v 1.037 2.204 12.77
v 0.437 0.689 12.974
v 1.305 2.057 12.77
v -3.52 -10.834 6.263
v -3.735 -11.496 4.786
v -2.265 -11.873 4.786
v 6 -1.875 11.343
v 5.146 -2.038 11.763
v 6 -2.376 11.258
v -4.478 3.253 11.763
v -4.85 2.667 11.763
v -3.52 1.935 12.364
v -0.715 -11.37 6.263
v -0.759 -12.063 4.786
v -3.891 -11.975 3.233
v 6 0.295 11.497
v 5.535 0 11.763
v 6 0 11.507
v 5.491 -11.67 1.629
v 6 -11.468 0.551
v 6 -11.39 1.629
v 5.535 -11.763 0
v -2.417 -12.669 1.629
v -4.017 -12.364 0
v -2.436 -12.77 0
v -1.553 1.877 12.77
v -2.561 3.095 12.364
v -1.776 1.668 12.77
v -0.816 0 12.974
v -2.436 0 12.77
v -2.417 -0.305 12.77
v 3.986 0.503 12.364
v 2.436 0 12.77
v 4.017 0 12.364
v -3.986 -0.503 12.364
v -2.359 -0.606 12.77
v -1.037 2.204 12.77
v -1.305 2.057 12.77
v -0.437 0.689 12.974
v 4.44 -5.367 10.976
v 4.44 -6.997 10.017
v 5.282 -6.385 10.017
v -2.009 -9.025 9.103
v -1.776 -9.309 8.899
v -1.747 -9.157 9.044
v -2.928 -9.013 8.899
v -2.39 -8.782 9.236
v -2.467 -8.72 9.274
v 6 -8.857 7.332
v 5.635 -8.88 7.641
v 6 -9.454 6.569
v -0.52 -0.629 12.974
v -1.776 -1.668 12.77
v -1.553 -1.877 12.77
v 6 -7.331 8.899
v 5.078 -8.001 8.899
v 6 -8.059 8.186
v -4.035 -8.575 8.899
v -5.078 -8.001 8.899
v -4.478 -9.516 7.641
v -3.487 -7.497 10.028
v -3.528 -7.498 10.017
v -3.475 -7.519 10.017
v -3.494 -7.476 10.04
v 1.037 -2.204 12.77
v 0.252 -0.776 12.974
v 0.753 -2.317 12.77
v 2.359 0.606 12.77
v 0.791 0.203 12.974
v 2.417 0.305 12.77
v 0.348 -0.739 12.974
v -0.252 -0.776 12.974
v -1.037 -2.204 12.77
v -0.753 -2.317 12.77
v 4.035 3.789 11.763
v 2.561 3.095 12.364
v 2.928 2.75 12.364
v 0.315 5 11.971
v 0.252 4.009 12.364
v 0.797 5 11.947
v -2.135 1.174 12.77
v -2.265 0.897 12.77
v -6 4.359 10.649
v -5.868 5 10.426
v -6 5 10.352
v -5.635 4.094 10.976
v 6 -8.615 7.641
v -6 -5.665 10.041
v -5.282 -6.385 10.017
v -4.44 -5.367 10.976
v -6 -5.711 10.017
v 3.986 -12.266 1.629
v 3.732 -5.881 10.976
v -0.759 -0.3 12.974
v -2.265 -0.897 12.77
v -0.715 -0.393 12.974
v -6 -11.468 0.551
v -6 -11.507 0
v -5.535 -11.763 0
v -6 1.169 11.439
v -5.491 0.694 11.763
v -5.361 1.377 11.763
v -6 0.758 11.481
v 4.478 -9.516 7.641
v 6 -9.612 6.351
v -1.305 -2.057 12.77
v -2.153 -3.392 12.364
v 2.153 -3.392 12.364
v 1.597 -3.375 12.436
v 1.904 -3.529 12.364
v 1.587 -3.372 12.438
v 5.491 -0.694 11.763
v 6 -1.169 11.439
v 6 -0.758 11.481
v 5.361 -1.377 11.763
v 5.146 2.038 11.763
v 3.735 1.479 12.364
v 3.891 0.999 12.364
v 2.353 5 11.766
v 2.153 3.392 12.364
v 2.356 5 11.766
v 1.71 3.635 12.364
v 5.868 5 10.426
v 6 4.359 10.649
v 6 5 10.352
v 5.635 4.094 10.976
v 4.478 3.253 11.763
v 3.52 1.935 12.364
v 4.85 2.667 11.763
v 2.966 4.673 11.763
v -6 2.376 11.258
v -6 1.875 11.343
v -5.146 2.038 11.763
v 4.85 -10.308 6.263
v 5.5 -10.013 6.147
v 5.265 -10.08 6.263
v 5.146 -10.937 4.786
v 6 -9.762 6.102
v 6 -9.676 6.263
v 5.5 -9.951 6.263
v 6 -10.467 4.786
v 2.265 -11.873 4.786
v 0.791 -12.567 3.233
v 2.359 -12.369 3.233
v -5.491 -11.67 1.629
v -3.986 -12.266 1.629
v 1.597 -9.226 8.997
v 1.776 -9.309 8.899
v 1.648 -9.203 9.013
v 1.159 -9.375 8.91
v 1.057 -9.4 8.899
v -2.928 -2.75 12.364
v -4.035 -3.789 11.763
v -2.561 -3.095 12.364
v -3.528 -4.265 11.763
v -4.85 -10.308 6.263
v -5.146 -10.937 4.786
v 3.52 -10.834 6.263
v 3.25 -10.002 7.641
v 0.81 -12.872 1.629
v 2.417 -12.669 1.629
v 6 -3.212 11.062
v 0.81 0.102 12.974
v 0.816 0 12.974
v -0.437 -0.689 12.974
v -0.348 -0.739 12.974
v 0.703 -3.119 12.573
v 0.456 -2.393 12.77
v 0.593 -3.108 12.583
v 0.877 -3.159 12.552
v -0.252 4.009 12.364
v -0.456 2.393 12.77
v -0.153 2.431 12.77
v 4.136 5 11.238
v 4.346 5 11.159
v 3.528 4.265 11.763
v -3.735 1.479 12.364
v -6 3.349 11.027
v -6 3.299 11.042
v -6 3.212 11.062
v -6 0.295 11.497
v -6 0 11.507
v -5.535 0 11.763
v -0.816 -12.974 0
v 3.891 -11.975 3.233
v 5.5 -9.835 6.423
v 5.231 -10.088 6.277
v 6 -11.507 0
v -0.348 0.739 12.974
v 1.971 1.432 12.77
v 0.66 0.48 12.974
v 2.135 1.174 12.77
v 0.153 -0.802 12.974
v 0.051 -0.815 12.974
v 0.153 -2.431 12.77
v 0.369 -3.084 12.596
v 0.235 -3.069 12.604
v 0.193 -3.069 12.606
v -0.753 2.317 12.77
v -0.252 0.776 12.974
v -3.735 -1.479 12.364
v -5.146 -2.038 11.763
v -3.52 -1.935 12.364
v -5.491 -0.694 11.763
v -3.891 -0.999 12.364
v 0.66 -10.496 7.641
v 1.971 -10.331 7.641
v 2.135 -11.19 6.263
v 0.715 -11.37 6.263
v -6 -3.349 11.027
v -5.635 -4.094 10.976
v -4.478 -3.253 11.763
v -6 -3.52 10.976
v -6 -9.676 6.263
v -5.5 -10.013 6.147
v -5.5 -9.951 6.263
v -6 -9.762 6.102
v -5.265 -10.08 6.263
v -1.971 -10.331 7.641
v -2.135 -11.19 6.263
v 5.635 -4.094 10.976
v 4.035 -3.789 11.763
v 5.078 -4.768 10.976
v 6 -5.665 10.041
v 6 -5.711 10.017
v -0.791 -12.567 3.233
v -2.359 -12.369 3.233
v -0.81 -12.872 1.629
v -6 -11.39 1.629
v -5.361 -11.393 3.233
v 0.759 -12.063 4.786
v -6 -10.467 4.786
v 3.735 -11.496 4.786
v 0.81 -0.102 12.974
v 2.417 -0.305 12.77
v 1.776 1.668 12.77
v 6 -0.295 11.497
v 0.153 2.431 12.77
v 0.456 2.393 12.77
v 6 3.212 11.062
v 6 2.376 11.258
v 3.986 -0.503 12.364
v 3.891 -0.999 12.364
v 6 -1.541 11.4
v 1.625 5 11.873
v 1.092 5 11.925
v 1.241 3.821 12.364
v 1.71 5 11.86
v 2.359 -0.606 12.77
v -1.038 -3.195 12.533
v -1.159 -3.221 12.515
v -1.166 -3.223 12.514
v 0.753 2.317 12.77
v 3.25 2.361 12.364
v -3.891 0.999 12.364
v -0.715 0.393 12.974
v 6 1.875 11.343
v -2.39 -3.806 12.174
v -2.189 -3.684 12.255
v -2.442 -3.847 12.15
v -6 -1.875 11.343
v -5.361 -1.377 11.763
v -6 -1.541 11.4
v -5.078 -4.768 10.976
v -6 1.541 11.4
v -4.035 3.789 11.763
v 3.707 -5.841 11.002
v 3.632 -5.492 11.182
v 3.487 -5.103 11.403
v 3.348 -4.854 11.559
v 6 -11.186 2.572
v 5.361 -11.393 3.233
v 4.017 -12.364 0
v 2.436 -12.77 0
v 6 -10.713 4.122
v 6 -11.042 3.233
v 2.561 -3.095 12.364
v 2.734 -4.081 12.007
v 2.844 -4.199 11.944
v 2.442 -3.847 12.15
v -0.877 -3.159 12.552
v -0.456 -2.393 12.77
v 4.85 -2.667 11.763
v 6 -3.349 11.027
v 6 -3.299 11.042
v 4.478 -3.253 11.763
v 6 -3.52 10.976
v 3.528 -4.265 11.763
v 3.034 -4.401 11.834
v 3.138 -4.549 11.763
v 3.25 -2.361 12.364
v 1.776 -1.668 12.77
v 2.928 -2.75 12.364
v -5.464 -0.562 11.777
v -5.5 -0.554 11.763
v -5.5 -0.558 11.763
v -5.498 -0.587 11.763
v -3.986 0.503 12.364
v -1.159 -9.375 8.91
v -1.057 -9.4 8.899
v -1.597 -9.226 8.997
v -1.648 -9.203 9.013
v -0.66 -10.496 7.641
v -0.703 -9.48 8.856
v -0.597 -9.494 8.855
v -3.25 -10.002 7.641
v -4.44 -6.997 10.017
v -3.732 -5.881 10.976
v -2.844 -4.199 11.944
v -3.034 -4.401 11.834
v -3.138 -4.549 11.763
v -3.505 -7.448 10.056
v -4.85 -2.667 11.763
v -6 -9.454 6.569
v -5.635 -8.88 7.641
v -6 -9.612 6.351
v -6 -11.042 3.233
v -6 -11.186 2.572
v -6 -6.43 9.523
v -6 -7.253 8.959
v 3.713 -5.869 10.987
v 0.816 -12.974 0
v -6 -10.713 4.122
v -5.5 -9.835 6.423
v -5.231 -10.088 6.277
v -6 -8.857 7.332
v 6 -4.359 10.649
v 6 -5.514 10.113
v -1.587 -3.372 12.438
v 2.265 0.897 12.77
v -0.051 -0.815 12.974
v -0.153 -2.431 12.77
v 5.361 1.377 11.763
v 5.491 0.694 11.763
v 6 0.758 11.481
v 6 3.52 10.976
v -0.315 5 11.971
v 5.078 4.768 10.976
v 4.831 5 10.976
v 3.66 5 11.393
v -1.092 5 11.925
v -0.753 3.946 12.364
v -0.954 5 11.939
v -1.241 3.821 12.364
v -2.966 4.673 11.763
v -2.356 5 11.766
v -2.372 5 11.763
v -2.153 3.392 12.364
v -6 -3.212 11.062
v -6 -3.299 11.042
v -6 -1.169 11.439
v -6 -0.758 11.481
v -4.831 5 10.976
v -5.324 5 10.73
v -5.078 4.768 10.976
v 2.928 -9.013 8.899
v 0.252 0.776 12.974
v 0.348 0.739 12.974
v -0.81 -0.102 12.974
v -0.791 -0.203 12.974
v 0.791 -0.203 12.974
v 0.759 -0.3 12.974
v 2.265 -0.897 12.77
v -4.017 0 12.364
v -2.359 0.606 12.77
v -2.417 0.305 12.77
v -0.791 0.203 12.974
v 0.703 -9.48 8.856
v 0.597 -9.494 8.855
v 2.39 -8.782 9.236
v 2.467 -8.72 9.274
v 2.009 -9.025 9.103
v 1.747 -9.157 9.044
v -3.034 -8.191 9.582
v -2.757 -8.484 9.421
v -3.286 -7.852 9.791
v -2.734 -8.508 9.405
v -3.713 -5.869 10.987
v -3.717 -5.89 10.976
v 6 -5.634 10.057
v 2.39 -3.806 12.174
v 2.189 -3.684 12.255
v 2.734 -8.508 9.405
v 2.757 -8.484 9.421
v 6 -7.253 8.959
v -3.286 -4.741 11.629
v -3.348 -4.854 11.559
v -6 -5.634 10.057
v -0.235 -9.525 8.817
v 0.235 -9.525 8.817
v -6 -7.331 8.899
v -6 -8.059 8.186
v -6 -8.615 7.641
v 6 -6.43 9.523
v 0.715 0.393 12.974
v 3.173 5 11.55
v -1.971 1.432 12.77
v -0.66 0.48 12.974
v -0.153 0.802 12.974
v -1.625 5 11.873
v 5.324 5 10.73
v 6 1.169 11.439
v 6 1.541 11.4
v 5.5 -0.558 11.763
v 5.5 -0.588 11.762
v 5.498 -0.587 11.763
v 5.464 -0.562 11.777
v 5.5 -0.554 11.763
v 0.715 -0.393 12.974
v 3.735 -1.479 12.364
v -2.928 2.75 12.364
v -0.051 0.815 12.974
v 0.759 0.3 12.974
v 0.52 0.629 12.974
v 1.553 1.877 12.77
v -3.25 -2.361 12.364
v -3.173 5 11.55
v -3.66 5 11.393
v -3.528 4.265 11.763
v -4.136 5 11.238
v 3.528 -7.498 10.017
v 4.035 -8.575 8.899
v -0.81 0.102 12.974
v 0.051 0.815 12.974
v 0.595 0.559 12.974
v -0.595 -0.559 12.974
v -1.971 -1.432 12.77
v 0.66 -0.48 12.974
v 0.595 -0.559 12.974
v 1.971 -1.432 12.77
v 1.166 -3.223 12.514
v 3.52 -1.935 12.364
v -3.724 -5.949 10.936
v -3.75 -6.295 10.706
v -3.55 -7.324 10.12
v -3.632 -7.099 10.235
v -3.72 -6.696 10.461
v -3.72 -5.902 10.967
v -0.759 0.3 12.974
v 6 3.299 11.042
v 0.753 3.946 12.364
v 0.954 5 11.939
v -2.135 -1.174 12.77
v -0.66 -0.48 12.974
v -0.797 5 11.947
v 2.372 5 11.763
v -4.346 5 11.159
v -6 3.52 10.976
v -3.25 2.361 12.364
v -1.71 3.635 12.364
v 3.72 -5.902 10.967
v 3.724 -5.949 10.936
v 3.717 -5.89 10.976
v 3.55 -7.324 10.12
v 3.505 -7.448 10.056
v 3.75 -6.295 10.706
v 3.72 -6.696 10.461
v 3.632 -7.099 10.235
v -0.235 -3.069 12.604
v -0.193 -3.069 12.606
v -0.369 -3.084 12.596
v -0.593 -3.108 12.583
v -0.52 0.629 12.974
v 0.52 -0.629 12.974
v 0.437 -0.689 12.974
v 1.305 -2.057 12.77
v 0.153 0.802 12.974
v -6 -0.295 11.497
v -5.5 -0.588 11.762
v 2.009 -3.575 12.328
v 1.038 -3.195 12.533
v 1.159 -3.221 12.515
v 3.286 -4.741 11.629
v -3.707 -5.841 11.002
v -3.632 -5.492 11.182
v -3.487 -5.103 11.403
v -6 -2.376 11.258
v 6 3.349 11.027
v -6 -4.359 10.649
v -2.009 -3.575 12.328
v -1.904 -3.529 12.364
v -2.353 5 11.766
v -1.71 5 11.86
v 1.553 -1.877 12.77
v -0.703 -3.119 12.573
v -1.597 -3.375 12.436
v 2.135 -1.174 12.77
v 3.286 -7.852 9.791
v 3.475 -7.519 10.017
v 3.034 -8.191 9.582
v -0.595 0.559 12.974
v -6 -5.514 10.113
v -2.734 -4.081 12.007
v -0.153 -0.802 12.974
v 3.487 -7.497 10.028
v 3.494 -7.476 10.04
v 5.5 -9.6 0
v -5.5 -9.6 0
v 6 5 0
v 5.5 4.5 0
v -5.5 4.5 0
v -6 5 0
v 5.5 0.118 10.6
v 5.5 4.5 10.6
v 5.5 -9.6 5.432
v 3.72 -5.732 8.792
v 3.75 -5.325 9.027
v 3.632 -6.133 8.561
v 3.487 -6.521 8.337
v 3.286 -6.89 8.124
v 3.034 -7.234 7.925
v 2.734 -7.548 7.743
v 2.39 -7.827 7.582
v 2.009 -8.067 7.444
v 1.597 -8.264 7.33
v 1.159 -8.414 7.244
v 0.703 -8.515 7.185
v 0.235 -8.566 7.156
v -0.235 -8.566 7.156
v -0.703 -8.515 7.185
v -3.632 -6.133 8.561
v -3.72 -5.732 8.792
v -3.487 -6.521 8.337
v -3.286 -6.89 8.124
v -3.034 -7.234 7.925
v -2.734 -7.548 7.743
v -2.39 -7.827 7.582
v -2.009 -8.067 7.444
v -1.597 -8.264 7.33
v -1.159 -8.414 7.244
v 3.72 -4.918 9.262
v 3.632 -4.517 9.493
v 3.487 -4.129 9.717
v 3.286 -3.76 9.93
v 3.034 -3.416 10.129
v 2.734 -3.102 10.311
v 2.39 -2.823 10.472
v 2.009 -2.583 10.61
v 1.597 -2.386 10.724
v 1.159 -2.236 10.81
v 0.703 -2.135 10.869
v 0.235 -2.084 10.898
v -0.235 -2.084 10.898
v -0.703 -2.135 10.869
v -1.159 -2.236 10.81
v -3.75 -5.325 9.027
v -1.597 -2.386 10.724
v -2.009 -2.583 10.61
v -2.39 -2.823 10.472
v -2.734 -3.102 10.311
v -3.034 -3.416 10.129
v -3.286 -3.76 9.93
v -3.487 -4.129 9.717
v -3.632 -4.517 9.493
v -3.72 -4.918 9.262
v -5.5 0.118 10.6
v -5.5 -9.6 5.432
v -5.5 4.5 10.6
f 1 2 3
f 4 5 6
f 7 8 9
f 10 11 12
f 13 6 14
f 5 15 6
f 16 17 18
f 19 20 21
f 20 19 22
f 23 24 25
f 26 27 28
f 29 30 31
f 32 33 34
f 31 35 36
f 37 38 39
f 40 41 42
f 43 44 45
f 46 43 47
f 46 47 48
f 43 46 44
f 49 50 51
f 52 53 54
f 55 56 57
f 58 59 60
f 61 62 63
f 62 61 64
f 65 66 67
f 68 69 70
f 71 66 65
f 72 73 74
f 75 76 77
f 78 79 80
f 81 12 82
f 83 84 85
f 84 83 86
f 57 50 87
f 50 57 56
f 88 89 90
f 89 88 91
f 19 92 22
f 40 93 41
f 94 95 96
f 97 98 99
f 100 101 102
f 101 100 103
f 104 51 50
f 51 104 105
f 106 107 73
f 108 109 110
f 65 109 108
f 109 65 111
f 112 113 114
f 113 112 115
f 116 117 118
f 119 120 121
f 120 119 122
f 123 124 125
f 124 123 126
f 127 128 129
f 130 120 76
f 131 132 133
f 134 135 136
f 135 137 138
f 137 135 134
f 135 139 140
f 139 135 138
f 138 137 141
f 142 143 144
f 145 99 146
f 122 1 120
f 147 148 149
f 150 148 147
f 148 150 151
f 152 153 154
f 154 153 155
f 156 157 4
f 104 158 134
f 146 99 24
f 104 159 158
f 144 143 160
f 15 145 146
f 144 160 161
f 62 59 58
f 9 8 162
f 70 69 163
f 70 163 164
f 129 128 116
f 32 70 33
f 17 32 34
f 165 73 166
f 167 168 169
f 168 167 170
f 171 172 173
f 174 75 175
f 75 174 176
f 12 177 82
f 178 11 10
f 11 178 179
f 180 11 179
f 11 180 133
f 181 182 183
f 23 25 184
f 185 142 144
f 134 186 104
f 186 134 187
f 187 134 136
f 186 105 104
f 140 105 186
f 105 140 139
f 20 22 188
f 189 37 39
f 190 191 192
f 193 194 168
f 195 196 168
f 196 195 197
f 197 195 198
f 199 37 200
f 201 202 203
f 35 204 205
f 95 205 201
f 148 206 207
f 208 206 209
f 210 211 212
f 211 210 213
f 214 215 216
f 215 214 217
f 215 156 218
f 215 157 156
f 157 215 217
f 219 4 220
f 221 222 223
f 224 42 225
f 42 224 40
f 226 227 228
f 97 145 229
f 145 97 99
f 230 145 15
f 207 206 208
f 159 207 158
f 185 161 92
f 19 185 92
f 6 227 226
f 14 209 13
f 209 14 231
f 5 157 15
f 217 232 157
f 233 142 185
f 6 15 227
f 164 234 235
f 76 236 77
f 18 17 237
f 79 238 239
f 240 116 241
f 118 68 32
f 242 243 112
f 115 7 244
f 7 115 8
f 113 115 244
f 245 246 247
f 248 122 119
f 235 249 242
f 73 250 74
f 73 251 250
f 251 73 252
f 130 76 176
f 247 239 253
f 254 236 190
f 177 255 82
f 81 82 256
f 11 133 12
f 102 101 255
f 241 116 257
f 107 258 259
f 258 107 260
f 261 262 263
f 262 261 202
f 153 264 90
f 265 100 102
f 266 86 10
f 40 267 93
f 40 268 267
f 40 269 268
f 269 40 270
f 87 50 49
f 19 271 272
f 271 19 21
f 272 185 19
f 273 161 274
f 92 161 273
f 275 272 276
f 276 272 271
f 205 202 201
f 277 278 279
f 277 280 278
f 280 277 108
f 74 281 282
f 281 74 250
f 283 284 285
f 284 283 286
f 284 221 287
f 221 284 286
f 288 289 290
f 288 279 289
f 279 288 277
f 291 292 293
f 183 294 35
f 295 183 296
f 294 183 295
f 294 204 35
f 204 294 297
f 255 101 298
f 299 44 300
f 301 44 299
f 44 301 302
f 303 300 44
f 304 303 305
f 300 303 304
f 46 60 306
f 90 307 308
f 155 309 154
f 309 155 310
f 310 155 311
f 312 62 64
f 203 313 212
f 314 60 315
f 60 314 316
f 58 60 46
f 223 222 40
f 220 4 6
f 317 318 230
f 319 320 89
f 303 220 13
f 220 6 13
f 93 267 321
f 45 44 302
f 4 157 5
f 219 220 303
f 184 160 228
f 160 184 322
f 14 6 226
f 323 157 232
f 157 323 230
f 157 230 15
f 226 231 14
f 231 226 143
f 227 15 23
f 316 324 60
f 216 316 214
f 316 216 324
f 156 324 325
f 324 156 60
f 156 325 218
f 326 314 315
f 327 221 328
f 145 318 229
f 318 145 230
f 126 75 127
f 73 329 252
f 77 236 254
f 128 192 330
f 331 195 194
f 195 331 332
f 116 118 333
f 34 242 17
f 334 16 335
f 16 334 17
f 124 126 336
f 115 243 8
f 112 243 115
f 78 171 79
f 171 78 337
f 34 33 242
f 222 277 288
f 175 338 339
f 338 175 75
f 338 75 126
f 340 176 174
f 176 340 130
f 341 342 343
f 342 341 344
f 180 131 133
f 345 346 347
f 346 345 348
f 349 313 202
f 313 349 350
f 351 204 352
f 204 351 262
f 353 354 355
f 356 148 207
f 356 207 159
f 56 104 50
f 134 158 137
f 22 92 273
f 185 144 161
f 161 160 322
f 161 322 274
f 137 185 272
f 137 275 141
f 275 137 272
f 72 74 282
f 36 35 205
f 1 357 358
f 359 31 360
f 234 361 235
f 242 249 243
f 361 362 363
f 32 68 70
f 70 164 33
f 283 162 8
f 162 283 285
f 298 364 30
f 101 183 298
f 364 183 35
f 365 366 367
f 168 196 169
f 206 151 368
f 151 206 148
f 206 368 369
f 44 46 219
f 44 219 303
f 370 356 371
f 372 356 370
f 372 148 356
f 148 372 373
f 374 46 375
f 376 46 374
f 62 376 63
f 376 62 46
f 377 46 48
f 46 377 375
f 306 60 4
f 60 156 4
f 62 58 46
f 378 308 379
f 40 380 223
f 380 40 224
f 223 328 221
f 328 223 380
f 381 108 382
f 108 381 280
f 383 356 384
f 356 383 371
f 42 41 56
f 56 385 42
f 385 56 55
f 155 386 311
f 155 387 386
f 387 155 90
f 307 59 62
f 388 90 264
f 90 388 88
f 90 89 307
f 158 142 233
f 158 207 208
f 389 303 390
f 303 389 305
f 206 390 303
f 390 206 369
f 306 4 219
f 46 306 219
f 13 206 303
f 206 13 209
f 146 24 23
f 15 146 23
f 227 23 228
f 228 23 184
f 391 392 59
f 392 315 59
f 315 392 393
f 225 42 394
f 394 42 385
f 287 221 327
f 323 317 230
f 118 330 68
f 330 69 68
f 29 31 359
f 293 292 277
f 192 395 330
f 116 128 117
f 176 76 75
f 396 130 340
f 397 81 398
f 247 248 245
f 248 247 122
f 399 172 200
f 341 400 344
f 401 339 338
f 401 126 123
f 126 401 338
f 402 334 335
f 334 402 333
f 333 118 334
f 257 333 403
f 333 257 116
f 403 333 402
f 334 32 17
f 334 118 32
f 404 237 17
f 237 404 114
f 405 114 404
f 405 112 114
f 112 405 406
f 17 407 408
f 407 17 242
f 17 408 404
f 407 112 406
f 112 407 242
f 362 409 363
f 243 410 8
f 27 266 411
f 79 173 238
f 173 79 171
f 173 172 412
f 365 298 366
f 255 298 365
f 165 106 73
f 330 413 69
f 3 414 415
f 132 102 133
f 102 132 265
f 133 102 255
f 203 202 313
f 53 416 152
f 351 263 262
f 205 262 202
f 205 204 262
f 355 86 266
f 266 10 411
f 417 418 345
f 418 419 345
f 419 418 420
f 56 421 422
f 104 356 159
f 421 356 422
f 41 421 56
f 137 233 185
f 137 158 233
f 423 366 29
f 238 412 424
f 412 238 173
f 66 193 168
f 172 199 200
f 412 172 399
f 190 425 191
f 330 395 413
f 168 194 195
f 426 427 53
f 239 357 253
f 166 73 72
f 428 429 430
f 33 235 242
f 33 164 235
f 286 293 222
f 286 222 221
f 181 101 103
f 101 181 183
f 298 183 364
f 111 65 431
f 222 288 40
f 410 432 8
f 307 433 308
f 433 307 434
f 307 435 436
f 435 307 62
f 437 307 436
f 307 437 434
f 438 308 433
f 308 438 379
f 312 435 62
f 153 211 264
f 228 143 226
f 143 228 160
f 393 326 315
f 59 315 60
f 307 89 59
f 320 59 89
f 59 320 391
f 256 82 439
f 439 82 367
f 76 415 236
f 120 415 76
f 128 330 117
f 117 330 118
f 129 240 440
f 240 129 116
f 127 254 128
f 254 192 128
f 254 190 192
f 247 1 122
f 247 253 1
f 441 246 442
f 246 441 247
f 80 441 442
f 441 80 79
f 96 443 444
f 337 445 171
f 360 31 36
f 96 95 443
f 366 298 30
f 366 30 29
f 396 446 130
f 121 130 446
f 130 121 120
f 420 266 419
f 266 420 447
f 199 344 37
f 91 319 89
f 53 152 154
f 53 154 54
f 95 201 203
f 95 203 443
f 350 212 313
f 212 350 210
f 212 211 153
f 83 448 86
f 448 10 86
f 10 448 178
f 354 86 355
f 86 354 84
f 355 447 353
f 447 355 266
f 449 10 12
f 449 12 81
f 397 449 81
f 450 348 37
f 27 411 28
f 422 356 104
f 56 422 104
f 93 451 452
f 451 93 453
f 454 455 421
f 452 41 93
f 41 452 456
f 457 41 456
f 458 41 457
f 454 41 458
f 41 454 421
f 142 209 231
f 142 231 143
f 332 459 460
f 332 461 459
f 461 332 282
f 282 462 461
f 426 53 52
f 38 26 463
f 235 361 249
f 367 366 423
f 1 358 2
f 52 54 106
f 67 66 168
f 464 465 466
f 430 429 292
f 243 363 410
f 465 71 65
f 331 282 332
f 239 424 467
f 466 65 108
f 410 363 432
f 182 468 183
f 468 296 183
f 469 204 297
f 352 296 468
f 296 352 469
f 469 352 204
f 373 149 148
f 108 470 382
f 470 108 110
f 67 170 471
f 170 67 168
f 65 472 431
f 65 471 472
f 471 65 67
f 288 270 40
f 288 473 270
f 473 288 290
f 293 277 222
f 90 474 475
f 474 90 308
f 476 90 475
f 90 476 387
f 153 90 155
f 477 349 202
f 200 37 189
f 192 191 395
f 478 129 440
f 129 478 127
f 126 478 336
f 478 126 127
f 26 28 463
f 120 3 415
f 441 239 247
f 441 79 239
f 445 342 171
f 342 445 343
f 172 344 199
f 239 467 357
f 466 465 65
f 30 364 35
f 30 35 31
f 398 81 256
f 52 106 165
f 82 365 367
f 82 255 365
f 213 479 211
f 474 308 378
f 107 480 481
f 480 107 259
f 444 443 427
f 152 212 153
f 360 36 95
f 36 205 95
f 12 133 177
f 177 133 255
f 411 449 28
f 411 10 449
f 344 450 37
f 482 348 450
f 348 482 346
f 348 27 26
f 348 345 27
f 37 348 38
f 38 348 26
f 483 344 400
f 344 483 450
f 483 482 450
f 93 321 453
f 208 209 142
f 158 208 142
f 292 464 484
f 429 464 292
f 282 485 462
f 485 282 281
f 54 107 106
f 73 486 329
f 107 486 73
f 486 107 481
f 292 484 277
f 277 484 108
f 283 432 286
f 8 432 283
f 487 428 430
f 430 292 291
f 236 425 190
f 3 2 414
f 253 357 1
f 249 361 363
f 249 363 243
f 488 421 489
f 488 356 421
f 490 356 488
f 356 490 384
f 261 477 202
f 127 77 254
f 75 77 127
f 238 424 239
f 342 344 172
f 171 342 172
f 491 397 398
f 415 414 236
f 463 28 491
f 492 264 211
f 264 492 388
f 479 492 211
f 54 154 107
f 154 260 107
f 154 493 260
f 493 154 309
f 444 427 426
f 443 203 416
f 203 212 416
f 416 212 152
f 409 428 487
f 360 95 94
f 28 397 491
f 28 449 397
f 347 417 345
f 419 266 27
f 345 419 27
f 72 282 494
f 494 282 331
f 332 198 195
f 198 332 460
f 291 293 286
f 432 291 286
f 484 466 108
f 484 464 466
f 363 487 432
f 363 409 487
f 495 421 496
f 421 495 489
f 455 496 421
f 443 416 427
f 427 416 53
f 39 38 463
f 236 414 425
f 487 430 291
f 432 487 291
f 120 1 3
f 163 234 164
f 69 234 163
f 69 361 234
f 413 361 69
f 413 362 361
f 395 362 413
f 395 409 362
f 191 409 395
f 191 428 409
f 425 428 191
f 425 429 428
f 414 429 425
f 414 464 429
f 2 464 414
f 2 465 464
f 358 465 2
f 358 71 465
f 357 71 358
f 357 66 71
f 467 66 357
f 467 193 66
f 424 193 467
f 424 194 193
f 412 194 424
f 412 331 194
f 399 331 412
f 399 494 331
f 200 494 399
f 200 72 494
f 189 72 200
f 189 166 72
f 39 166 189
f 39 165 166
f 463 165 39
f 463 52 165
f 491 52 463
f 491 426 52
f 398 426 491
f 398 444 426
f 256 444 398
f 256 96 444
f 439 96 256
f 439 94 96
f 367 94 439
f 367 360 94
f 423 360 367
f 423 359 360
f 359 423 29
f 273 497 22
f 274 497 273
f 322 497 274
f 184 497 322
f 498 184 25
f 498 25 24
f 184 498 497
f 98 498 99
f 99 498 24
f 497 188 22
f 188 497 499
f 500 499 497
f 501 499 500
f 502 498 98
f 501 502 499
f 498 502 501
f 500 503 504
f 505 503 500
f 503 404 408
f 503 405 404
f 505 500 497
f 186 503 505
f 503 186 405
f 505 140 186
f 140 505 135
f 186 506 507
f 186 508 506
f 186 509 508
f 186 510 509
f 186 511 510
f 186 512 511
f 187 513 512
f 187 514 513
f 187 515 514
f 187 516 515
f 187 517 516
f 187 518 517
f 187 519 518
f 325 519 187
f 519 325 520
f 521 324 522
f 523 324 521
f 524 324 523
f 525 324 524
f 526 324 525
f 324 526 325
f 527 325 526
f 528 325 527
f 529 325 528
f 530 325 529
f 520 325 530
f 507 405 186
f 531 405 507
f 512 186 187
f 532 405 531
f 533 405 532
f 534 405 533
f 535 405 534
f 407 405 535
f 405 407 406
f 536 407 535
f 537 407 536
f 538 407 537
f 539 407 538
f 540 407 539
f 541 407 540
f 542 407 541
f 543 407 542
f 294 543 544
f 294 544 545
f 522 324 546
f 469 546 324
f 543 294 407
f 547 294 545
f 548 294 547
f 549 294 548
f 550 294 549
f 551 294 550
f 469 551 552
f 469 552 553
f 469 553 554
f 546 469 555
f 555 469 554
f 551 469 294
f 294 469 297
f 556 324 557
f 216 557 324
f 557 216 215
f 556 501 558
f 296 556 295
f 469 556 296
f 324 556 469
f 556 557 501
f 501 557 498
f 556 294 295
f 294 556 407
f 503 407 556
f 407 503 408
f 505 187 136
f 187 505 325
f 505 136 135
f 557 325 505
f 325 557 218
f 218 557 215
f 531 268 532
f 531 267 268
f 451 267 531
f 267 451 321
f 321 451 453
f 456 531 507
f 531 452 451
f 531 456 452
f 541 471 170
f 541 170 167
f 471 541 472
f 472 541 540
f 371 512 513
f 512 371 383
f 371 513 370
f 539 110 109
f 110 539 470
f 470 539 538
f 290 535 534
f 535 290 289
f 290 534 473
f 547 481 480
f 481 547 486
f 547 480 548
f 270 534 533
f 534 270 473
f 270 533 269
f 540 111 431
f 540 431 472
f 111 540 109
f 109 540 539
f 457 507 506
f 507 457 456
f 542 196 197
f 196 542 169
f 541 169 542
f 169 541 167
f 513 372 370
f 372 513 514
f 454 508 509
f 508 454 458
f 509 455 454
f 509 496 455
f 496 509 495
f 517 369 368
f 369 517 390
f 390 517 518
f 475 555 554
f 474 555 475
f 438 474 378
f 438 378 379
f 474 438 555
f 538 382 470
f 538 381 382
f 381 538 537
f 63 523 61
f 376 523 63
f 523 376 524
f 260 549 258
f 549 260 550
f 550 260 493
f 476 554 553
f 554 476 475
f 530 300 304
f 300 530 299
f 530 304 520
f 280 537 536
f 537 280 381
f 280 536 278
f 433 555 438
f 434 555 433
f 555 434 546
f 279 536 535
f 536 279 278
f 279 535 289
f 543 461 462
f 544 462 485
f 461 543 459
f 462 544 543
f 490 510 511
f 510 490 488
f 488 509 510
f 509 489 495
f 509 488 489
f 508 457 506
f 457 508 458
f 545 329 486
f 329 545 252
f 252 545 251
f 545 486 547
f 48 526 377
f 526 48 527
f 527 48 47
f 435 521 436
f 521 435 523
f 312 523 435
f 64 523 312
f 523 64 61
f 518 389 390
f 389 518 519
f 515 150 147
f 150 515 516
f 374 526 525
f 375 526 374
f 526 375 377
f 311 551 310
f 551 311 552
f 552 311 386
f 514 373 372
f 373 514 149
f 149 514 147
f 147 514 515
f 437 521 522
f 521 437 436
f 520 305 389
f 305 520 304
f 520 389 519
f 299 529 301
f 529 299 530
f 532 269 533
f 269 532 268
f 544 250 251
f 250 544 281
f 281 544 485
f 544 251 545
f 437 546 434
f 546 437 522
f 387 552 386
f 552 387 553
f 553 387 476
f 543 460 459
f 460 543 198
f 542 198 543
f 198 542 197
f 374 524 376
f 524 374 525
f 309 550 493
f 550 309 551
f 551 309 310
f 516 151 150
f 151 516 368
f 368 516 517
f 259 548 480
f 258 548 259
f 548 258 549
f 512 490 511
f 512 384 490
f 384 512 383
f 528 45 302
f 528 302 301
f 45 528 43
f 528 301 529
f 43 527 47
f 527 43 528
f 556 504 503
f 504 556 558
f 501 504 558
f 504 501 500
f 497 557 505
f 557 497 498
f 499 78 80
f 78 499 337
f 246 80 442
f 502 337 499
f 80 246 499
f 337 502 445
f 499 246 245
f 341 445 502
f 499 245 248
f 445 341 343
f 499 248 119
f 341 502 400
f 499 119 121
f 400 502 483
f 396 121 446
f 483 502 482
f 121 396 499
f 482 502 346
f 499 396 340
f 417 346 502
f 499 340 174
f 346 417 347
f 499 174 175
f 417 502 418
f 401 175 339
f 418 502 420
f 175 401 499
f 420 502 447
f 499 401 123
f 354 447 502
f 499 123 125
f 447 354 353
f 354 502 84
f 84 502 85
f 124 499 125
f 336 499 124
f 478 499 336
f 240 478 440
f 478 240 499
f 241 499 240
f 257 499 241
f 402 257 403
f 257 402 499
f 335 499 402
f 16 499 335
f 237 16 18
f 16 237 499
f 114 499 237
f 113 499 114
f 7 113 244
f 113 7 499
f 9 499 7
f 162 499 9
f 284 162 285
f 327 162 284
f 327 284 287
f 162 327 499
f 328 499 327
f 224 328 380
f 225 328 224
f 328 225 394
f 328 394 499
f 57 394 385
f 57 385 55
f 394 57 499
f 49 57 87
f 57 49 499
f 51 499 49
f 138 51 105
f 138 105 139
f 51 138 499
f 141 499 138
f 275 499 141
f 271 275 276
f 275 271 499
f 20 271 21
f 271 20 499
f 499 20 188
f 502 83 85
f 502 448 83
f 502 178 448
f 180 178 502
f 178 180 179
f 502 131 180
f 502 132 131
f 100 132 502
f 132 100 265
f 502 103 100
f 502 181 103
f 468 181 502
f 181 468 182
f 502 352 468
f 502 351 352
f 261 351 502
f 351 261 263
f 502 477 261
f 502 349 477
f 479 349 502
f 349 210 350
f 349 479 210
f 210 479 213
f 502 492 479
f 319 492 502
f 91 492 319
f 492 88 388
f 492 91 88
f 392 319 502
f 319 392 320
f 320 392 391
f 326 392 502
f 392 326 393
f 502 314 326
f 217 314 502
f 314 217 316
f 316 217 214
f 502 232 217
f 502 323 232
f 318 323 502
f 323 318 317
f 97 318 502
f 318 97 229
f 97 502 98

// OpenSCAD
facets = 50;

module hemisphere() {
  translate([0,0,-0]) {
    difference() {
      sphere(d=26, center=true, $fn=facets);
      translate([0,0,-25]) {
        cube([60,60,50],center=true);
      }
    }
  }
}

// Navigation Switch Dimensions in millimetres:
// Base: (10.08 or 10.68 at leads) x 10.05 x (3.11 or 3.62 at nubs)
// Stick lower: 7 (diameter at base) x 2.6
// Stick upper: 3.17 x 3.16 x 4.4
// 10.13 total height from base bottom to stick top.
module navigation_switch() {
  base_width=11.0;
  base_length=11.0;
  base_height=3.65;
  stick_lower_height=3.4; // 4.4 really
  stick_upper_width=3.17;
  stick_upper_length=3.16;
  // base
  translate([-(base_width/2), -(base_length/2), 0])
    cube([base_width, base_length, base_height]); // no nubs
  // stick lower
  translate([0,0,base_height])
    cylinder(d=7.5, h=stick_lower_height, $fn=facets);
  // stick upper
  // translate([-(stick_upper_width/2),-(stick_upper_length/2),base_height+stick_lower_height])
  //   cube([stick_upper_width, stick_upper_length, 4.4]);  
}

module rotated_navigation_switch() {
  translate([0,-3,5]) {
    rotate([30,0,0]) {
      translate([0,0,1]) {
        navigation_switch();
      }
    }
  }
}

difference() {
  difference() {
    difference() {
      hemisphere();
      union() {
        rotated_navigation_switch();
        union() {
          translate([-(11.0/2),-2.5,-1])
            cube([11.0,7.0,11.6]);
          translate([-(11.0/2),-9.6,-1])
            cube([11.0,7.5,7.5]);
        }
      }
    }
    translate([-15, 5, 0])
      cube(30,30,30);
  }
  union() {
    translate([6,-15,0])
      cube(30,30,30);
    translate([-26,-15,0])
      cube(20,20,20);
  }
}
